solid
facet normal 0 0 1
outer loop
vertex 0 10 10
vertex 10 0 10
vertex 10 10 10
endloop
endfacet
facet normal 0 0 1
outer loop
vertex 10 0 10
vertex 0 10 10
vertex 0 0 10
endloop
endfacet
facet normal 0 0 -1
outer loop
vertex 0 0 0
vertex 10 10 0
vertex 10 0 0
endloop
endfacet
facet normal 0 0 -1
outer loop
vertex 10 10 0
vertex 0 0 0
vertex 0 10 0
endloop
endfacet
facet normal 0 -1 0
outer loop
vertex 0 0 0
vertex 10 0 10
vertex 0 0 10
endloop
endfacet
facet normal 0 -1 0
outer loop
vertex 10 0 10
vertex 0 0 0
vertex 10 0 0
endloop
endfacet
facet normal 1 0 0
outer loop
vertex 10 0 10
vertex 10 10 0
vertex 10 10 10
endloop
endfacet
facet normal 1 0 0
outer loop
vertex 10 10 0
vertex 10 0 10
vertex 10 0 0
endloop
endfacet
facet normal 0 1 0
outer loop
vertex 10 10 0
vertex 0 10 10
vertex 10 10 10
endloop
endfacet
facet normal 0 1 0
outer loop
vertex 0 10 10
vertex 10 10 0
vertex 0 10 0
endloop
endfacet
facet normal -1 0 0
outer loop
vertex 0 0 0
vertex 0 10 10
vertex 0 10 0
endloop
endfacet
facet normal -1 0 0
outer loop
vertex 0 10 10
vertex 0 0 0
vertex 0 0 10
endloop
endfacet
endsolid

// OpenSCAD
// mini.scad: minimal fixture design used to verify gen-schema's default
// `source` ("." => beside the config).
/* [Basics] */
// Size in mm.
size = 10; // [1:50]
cube(size);
